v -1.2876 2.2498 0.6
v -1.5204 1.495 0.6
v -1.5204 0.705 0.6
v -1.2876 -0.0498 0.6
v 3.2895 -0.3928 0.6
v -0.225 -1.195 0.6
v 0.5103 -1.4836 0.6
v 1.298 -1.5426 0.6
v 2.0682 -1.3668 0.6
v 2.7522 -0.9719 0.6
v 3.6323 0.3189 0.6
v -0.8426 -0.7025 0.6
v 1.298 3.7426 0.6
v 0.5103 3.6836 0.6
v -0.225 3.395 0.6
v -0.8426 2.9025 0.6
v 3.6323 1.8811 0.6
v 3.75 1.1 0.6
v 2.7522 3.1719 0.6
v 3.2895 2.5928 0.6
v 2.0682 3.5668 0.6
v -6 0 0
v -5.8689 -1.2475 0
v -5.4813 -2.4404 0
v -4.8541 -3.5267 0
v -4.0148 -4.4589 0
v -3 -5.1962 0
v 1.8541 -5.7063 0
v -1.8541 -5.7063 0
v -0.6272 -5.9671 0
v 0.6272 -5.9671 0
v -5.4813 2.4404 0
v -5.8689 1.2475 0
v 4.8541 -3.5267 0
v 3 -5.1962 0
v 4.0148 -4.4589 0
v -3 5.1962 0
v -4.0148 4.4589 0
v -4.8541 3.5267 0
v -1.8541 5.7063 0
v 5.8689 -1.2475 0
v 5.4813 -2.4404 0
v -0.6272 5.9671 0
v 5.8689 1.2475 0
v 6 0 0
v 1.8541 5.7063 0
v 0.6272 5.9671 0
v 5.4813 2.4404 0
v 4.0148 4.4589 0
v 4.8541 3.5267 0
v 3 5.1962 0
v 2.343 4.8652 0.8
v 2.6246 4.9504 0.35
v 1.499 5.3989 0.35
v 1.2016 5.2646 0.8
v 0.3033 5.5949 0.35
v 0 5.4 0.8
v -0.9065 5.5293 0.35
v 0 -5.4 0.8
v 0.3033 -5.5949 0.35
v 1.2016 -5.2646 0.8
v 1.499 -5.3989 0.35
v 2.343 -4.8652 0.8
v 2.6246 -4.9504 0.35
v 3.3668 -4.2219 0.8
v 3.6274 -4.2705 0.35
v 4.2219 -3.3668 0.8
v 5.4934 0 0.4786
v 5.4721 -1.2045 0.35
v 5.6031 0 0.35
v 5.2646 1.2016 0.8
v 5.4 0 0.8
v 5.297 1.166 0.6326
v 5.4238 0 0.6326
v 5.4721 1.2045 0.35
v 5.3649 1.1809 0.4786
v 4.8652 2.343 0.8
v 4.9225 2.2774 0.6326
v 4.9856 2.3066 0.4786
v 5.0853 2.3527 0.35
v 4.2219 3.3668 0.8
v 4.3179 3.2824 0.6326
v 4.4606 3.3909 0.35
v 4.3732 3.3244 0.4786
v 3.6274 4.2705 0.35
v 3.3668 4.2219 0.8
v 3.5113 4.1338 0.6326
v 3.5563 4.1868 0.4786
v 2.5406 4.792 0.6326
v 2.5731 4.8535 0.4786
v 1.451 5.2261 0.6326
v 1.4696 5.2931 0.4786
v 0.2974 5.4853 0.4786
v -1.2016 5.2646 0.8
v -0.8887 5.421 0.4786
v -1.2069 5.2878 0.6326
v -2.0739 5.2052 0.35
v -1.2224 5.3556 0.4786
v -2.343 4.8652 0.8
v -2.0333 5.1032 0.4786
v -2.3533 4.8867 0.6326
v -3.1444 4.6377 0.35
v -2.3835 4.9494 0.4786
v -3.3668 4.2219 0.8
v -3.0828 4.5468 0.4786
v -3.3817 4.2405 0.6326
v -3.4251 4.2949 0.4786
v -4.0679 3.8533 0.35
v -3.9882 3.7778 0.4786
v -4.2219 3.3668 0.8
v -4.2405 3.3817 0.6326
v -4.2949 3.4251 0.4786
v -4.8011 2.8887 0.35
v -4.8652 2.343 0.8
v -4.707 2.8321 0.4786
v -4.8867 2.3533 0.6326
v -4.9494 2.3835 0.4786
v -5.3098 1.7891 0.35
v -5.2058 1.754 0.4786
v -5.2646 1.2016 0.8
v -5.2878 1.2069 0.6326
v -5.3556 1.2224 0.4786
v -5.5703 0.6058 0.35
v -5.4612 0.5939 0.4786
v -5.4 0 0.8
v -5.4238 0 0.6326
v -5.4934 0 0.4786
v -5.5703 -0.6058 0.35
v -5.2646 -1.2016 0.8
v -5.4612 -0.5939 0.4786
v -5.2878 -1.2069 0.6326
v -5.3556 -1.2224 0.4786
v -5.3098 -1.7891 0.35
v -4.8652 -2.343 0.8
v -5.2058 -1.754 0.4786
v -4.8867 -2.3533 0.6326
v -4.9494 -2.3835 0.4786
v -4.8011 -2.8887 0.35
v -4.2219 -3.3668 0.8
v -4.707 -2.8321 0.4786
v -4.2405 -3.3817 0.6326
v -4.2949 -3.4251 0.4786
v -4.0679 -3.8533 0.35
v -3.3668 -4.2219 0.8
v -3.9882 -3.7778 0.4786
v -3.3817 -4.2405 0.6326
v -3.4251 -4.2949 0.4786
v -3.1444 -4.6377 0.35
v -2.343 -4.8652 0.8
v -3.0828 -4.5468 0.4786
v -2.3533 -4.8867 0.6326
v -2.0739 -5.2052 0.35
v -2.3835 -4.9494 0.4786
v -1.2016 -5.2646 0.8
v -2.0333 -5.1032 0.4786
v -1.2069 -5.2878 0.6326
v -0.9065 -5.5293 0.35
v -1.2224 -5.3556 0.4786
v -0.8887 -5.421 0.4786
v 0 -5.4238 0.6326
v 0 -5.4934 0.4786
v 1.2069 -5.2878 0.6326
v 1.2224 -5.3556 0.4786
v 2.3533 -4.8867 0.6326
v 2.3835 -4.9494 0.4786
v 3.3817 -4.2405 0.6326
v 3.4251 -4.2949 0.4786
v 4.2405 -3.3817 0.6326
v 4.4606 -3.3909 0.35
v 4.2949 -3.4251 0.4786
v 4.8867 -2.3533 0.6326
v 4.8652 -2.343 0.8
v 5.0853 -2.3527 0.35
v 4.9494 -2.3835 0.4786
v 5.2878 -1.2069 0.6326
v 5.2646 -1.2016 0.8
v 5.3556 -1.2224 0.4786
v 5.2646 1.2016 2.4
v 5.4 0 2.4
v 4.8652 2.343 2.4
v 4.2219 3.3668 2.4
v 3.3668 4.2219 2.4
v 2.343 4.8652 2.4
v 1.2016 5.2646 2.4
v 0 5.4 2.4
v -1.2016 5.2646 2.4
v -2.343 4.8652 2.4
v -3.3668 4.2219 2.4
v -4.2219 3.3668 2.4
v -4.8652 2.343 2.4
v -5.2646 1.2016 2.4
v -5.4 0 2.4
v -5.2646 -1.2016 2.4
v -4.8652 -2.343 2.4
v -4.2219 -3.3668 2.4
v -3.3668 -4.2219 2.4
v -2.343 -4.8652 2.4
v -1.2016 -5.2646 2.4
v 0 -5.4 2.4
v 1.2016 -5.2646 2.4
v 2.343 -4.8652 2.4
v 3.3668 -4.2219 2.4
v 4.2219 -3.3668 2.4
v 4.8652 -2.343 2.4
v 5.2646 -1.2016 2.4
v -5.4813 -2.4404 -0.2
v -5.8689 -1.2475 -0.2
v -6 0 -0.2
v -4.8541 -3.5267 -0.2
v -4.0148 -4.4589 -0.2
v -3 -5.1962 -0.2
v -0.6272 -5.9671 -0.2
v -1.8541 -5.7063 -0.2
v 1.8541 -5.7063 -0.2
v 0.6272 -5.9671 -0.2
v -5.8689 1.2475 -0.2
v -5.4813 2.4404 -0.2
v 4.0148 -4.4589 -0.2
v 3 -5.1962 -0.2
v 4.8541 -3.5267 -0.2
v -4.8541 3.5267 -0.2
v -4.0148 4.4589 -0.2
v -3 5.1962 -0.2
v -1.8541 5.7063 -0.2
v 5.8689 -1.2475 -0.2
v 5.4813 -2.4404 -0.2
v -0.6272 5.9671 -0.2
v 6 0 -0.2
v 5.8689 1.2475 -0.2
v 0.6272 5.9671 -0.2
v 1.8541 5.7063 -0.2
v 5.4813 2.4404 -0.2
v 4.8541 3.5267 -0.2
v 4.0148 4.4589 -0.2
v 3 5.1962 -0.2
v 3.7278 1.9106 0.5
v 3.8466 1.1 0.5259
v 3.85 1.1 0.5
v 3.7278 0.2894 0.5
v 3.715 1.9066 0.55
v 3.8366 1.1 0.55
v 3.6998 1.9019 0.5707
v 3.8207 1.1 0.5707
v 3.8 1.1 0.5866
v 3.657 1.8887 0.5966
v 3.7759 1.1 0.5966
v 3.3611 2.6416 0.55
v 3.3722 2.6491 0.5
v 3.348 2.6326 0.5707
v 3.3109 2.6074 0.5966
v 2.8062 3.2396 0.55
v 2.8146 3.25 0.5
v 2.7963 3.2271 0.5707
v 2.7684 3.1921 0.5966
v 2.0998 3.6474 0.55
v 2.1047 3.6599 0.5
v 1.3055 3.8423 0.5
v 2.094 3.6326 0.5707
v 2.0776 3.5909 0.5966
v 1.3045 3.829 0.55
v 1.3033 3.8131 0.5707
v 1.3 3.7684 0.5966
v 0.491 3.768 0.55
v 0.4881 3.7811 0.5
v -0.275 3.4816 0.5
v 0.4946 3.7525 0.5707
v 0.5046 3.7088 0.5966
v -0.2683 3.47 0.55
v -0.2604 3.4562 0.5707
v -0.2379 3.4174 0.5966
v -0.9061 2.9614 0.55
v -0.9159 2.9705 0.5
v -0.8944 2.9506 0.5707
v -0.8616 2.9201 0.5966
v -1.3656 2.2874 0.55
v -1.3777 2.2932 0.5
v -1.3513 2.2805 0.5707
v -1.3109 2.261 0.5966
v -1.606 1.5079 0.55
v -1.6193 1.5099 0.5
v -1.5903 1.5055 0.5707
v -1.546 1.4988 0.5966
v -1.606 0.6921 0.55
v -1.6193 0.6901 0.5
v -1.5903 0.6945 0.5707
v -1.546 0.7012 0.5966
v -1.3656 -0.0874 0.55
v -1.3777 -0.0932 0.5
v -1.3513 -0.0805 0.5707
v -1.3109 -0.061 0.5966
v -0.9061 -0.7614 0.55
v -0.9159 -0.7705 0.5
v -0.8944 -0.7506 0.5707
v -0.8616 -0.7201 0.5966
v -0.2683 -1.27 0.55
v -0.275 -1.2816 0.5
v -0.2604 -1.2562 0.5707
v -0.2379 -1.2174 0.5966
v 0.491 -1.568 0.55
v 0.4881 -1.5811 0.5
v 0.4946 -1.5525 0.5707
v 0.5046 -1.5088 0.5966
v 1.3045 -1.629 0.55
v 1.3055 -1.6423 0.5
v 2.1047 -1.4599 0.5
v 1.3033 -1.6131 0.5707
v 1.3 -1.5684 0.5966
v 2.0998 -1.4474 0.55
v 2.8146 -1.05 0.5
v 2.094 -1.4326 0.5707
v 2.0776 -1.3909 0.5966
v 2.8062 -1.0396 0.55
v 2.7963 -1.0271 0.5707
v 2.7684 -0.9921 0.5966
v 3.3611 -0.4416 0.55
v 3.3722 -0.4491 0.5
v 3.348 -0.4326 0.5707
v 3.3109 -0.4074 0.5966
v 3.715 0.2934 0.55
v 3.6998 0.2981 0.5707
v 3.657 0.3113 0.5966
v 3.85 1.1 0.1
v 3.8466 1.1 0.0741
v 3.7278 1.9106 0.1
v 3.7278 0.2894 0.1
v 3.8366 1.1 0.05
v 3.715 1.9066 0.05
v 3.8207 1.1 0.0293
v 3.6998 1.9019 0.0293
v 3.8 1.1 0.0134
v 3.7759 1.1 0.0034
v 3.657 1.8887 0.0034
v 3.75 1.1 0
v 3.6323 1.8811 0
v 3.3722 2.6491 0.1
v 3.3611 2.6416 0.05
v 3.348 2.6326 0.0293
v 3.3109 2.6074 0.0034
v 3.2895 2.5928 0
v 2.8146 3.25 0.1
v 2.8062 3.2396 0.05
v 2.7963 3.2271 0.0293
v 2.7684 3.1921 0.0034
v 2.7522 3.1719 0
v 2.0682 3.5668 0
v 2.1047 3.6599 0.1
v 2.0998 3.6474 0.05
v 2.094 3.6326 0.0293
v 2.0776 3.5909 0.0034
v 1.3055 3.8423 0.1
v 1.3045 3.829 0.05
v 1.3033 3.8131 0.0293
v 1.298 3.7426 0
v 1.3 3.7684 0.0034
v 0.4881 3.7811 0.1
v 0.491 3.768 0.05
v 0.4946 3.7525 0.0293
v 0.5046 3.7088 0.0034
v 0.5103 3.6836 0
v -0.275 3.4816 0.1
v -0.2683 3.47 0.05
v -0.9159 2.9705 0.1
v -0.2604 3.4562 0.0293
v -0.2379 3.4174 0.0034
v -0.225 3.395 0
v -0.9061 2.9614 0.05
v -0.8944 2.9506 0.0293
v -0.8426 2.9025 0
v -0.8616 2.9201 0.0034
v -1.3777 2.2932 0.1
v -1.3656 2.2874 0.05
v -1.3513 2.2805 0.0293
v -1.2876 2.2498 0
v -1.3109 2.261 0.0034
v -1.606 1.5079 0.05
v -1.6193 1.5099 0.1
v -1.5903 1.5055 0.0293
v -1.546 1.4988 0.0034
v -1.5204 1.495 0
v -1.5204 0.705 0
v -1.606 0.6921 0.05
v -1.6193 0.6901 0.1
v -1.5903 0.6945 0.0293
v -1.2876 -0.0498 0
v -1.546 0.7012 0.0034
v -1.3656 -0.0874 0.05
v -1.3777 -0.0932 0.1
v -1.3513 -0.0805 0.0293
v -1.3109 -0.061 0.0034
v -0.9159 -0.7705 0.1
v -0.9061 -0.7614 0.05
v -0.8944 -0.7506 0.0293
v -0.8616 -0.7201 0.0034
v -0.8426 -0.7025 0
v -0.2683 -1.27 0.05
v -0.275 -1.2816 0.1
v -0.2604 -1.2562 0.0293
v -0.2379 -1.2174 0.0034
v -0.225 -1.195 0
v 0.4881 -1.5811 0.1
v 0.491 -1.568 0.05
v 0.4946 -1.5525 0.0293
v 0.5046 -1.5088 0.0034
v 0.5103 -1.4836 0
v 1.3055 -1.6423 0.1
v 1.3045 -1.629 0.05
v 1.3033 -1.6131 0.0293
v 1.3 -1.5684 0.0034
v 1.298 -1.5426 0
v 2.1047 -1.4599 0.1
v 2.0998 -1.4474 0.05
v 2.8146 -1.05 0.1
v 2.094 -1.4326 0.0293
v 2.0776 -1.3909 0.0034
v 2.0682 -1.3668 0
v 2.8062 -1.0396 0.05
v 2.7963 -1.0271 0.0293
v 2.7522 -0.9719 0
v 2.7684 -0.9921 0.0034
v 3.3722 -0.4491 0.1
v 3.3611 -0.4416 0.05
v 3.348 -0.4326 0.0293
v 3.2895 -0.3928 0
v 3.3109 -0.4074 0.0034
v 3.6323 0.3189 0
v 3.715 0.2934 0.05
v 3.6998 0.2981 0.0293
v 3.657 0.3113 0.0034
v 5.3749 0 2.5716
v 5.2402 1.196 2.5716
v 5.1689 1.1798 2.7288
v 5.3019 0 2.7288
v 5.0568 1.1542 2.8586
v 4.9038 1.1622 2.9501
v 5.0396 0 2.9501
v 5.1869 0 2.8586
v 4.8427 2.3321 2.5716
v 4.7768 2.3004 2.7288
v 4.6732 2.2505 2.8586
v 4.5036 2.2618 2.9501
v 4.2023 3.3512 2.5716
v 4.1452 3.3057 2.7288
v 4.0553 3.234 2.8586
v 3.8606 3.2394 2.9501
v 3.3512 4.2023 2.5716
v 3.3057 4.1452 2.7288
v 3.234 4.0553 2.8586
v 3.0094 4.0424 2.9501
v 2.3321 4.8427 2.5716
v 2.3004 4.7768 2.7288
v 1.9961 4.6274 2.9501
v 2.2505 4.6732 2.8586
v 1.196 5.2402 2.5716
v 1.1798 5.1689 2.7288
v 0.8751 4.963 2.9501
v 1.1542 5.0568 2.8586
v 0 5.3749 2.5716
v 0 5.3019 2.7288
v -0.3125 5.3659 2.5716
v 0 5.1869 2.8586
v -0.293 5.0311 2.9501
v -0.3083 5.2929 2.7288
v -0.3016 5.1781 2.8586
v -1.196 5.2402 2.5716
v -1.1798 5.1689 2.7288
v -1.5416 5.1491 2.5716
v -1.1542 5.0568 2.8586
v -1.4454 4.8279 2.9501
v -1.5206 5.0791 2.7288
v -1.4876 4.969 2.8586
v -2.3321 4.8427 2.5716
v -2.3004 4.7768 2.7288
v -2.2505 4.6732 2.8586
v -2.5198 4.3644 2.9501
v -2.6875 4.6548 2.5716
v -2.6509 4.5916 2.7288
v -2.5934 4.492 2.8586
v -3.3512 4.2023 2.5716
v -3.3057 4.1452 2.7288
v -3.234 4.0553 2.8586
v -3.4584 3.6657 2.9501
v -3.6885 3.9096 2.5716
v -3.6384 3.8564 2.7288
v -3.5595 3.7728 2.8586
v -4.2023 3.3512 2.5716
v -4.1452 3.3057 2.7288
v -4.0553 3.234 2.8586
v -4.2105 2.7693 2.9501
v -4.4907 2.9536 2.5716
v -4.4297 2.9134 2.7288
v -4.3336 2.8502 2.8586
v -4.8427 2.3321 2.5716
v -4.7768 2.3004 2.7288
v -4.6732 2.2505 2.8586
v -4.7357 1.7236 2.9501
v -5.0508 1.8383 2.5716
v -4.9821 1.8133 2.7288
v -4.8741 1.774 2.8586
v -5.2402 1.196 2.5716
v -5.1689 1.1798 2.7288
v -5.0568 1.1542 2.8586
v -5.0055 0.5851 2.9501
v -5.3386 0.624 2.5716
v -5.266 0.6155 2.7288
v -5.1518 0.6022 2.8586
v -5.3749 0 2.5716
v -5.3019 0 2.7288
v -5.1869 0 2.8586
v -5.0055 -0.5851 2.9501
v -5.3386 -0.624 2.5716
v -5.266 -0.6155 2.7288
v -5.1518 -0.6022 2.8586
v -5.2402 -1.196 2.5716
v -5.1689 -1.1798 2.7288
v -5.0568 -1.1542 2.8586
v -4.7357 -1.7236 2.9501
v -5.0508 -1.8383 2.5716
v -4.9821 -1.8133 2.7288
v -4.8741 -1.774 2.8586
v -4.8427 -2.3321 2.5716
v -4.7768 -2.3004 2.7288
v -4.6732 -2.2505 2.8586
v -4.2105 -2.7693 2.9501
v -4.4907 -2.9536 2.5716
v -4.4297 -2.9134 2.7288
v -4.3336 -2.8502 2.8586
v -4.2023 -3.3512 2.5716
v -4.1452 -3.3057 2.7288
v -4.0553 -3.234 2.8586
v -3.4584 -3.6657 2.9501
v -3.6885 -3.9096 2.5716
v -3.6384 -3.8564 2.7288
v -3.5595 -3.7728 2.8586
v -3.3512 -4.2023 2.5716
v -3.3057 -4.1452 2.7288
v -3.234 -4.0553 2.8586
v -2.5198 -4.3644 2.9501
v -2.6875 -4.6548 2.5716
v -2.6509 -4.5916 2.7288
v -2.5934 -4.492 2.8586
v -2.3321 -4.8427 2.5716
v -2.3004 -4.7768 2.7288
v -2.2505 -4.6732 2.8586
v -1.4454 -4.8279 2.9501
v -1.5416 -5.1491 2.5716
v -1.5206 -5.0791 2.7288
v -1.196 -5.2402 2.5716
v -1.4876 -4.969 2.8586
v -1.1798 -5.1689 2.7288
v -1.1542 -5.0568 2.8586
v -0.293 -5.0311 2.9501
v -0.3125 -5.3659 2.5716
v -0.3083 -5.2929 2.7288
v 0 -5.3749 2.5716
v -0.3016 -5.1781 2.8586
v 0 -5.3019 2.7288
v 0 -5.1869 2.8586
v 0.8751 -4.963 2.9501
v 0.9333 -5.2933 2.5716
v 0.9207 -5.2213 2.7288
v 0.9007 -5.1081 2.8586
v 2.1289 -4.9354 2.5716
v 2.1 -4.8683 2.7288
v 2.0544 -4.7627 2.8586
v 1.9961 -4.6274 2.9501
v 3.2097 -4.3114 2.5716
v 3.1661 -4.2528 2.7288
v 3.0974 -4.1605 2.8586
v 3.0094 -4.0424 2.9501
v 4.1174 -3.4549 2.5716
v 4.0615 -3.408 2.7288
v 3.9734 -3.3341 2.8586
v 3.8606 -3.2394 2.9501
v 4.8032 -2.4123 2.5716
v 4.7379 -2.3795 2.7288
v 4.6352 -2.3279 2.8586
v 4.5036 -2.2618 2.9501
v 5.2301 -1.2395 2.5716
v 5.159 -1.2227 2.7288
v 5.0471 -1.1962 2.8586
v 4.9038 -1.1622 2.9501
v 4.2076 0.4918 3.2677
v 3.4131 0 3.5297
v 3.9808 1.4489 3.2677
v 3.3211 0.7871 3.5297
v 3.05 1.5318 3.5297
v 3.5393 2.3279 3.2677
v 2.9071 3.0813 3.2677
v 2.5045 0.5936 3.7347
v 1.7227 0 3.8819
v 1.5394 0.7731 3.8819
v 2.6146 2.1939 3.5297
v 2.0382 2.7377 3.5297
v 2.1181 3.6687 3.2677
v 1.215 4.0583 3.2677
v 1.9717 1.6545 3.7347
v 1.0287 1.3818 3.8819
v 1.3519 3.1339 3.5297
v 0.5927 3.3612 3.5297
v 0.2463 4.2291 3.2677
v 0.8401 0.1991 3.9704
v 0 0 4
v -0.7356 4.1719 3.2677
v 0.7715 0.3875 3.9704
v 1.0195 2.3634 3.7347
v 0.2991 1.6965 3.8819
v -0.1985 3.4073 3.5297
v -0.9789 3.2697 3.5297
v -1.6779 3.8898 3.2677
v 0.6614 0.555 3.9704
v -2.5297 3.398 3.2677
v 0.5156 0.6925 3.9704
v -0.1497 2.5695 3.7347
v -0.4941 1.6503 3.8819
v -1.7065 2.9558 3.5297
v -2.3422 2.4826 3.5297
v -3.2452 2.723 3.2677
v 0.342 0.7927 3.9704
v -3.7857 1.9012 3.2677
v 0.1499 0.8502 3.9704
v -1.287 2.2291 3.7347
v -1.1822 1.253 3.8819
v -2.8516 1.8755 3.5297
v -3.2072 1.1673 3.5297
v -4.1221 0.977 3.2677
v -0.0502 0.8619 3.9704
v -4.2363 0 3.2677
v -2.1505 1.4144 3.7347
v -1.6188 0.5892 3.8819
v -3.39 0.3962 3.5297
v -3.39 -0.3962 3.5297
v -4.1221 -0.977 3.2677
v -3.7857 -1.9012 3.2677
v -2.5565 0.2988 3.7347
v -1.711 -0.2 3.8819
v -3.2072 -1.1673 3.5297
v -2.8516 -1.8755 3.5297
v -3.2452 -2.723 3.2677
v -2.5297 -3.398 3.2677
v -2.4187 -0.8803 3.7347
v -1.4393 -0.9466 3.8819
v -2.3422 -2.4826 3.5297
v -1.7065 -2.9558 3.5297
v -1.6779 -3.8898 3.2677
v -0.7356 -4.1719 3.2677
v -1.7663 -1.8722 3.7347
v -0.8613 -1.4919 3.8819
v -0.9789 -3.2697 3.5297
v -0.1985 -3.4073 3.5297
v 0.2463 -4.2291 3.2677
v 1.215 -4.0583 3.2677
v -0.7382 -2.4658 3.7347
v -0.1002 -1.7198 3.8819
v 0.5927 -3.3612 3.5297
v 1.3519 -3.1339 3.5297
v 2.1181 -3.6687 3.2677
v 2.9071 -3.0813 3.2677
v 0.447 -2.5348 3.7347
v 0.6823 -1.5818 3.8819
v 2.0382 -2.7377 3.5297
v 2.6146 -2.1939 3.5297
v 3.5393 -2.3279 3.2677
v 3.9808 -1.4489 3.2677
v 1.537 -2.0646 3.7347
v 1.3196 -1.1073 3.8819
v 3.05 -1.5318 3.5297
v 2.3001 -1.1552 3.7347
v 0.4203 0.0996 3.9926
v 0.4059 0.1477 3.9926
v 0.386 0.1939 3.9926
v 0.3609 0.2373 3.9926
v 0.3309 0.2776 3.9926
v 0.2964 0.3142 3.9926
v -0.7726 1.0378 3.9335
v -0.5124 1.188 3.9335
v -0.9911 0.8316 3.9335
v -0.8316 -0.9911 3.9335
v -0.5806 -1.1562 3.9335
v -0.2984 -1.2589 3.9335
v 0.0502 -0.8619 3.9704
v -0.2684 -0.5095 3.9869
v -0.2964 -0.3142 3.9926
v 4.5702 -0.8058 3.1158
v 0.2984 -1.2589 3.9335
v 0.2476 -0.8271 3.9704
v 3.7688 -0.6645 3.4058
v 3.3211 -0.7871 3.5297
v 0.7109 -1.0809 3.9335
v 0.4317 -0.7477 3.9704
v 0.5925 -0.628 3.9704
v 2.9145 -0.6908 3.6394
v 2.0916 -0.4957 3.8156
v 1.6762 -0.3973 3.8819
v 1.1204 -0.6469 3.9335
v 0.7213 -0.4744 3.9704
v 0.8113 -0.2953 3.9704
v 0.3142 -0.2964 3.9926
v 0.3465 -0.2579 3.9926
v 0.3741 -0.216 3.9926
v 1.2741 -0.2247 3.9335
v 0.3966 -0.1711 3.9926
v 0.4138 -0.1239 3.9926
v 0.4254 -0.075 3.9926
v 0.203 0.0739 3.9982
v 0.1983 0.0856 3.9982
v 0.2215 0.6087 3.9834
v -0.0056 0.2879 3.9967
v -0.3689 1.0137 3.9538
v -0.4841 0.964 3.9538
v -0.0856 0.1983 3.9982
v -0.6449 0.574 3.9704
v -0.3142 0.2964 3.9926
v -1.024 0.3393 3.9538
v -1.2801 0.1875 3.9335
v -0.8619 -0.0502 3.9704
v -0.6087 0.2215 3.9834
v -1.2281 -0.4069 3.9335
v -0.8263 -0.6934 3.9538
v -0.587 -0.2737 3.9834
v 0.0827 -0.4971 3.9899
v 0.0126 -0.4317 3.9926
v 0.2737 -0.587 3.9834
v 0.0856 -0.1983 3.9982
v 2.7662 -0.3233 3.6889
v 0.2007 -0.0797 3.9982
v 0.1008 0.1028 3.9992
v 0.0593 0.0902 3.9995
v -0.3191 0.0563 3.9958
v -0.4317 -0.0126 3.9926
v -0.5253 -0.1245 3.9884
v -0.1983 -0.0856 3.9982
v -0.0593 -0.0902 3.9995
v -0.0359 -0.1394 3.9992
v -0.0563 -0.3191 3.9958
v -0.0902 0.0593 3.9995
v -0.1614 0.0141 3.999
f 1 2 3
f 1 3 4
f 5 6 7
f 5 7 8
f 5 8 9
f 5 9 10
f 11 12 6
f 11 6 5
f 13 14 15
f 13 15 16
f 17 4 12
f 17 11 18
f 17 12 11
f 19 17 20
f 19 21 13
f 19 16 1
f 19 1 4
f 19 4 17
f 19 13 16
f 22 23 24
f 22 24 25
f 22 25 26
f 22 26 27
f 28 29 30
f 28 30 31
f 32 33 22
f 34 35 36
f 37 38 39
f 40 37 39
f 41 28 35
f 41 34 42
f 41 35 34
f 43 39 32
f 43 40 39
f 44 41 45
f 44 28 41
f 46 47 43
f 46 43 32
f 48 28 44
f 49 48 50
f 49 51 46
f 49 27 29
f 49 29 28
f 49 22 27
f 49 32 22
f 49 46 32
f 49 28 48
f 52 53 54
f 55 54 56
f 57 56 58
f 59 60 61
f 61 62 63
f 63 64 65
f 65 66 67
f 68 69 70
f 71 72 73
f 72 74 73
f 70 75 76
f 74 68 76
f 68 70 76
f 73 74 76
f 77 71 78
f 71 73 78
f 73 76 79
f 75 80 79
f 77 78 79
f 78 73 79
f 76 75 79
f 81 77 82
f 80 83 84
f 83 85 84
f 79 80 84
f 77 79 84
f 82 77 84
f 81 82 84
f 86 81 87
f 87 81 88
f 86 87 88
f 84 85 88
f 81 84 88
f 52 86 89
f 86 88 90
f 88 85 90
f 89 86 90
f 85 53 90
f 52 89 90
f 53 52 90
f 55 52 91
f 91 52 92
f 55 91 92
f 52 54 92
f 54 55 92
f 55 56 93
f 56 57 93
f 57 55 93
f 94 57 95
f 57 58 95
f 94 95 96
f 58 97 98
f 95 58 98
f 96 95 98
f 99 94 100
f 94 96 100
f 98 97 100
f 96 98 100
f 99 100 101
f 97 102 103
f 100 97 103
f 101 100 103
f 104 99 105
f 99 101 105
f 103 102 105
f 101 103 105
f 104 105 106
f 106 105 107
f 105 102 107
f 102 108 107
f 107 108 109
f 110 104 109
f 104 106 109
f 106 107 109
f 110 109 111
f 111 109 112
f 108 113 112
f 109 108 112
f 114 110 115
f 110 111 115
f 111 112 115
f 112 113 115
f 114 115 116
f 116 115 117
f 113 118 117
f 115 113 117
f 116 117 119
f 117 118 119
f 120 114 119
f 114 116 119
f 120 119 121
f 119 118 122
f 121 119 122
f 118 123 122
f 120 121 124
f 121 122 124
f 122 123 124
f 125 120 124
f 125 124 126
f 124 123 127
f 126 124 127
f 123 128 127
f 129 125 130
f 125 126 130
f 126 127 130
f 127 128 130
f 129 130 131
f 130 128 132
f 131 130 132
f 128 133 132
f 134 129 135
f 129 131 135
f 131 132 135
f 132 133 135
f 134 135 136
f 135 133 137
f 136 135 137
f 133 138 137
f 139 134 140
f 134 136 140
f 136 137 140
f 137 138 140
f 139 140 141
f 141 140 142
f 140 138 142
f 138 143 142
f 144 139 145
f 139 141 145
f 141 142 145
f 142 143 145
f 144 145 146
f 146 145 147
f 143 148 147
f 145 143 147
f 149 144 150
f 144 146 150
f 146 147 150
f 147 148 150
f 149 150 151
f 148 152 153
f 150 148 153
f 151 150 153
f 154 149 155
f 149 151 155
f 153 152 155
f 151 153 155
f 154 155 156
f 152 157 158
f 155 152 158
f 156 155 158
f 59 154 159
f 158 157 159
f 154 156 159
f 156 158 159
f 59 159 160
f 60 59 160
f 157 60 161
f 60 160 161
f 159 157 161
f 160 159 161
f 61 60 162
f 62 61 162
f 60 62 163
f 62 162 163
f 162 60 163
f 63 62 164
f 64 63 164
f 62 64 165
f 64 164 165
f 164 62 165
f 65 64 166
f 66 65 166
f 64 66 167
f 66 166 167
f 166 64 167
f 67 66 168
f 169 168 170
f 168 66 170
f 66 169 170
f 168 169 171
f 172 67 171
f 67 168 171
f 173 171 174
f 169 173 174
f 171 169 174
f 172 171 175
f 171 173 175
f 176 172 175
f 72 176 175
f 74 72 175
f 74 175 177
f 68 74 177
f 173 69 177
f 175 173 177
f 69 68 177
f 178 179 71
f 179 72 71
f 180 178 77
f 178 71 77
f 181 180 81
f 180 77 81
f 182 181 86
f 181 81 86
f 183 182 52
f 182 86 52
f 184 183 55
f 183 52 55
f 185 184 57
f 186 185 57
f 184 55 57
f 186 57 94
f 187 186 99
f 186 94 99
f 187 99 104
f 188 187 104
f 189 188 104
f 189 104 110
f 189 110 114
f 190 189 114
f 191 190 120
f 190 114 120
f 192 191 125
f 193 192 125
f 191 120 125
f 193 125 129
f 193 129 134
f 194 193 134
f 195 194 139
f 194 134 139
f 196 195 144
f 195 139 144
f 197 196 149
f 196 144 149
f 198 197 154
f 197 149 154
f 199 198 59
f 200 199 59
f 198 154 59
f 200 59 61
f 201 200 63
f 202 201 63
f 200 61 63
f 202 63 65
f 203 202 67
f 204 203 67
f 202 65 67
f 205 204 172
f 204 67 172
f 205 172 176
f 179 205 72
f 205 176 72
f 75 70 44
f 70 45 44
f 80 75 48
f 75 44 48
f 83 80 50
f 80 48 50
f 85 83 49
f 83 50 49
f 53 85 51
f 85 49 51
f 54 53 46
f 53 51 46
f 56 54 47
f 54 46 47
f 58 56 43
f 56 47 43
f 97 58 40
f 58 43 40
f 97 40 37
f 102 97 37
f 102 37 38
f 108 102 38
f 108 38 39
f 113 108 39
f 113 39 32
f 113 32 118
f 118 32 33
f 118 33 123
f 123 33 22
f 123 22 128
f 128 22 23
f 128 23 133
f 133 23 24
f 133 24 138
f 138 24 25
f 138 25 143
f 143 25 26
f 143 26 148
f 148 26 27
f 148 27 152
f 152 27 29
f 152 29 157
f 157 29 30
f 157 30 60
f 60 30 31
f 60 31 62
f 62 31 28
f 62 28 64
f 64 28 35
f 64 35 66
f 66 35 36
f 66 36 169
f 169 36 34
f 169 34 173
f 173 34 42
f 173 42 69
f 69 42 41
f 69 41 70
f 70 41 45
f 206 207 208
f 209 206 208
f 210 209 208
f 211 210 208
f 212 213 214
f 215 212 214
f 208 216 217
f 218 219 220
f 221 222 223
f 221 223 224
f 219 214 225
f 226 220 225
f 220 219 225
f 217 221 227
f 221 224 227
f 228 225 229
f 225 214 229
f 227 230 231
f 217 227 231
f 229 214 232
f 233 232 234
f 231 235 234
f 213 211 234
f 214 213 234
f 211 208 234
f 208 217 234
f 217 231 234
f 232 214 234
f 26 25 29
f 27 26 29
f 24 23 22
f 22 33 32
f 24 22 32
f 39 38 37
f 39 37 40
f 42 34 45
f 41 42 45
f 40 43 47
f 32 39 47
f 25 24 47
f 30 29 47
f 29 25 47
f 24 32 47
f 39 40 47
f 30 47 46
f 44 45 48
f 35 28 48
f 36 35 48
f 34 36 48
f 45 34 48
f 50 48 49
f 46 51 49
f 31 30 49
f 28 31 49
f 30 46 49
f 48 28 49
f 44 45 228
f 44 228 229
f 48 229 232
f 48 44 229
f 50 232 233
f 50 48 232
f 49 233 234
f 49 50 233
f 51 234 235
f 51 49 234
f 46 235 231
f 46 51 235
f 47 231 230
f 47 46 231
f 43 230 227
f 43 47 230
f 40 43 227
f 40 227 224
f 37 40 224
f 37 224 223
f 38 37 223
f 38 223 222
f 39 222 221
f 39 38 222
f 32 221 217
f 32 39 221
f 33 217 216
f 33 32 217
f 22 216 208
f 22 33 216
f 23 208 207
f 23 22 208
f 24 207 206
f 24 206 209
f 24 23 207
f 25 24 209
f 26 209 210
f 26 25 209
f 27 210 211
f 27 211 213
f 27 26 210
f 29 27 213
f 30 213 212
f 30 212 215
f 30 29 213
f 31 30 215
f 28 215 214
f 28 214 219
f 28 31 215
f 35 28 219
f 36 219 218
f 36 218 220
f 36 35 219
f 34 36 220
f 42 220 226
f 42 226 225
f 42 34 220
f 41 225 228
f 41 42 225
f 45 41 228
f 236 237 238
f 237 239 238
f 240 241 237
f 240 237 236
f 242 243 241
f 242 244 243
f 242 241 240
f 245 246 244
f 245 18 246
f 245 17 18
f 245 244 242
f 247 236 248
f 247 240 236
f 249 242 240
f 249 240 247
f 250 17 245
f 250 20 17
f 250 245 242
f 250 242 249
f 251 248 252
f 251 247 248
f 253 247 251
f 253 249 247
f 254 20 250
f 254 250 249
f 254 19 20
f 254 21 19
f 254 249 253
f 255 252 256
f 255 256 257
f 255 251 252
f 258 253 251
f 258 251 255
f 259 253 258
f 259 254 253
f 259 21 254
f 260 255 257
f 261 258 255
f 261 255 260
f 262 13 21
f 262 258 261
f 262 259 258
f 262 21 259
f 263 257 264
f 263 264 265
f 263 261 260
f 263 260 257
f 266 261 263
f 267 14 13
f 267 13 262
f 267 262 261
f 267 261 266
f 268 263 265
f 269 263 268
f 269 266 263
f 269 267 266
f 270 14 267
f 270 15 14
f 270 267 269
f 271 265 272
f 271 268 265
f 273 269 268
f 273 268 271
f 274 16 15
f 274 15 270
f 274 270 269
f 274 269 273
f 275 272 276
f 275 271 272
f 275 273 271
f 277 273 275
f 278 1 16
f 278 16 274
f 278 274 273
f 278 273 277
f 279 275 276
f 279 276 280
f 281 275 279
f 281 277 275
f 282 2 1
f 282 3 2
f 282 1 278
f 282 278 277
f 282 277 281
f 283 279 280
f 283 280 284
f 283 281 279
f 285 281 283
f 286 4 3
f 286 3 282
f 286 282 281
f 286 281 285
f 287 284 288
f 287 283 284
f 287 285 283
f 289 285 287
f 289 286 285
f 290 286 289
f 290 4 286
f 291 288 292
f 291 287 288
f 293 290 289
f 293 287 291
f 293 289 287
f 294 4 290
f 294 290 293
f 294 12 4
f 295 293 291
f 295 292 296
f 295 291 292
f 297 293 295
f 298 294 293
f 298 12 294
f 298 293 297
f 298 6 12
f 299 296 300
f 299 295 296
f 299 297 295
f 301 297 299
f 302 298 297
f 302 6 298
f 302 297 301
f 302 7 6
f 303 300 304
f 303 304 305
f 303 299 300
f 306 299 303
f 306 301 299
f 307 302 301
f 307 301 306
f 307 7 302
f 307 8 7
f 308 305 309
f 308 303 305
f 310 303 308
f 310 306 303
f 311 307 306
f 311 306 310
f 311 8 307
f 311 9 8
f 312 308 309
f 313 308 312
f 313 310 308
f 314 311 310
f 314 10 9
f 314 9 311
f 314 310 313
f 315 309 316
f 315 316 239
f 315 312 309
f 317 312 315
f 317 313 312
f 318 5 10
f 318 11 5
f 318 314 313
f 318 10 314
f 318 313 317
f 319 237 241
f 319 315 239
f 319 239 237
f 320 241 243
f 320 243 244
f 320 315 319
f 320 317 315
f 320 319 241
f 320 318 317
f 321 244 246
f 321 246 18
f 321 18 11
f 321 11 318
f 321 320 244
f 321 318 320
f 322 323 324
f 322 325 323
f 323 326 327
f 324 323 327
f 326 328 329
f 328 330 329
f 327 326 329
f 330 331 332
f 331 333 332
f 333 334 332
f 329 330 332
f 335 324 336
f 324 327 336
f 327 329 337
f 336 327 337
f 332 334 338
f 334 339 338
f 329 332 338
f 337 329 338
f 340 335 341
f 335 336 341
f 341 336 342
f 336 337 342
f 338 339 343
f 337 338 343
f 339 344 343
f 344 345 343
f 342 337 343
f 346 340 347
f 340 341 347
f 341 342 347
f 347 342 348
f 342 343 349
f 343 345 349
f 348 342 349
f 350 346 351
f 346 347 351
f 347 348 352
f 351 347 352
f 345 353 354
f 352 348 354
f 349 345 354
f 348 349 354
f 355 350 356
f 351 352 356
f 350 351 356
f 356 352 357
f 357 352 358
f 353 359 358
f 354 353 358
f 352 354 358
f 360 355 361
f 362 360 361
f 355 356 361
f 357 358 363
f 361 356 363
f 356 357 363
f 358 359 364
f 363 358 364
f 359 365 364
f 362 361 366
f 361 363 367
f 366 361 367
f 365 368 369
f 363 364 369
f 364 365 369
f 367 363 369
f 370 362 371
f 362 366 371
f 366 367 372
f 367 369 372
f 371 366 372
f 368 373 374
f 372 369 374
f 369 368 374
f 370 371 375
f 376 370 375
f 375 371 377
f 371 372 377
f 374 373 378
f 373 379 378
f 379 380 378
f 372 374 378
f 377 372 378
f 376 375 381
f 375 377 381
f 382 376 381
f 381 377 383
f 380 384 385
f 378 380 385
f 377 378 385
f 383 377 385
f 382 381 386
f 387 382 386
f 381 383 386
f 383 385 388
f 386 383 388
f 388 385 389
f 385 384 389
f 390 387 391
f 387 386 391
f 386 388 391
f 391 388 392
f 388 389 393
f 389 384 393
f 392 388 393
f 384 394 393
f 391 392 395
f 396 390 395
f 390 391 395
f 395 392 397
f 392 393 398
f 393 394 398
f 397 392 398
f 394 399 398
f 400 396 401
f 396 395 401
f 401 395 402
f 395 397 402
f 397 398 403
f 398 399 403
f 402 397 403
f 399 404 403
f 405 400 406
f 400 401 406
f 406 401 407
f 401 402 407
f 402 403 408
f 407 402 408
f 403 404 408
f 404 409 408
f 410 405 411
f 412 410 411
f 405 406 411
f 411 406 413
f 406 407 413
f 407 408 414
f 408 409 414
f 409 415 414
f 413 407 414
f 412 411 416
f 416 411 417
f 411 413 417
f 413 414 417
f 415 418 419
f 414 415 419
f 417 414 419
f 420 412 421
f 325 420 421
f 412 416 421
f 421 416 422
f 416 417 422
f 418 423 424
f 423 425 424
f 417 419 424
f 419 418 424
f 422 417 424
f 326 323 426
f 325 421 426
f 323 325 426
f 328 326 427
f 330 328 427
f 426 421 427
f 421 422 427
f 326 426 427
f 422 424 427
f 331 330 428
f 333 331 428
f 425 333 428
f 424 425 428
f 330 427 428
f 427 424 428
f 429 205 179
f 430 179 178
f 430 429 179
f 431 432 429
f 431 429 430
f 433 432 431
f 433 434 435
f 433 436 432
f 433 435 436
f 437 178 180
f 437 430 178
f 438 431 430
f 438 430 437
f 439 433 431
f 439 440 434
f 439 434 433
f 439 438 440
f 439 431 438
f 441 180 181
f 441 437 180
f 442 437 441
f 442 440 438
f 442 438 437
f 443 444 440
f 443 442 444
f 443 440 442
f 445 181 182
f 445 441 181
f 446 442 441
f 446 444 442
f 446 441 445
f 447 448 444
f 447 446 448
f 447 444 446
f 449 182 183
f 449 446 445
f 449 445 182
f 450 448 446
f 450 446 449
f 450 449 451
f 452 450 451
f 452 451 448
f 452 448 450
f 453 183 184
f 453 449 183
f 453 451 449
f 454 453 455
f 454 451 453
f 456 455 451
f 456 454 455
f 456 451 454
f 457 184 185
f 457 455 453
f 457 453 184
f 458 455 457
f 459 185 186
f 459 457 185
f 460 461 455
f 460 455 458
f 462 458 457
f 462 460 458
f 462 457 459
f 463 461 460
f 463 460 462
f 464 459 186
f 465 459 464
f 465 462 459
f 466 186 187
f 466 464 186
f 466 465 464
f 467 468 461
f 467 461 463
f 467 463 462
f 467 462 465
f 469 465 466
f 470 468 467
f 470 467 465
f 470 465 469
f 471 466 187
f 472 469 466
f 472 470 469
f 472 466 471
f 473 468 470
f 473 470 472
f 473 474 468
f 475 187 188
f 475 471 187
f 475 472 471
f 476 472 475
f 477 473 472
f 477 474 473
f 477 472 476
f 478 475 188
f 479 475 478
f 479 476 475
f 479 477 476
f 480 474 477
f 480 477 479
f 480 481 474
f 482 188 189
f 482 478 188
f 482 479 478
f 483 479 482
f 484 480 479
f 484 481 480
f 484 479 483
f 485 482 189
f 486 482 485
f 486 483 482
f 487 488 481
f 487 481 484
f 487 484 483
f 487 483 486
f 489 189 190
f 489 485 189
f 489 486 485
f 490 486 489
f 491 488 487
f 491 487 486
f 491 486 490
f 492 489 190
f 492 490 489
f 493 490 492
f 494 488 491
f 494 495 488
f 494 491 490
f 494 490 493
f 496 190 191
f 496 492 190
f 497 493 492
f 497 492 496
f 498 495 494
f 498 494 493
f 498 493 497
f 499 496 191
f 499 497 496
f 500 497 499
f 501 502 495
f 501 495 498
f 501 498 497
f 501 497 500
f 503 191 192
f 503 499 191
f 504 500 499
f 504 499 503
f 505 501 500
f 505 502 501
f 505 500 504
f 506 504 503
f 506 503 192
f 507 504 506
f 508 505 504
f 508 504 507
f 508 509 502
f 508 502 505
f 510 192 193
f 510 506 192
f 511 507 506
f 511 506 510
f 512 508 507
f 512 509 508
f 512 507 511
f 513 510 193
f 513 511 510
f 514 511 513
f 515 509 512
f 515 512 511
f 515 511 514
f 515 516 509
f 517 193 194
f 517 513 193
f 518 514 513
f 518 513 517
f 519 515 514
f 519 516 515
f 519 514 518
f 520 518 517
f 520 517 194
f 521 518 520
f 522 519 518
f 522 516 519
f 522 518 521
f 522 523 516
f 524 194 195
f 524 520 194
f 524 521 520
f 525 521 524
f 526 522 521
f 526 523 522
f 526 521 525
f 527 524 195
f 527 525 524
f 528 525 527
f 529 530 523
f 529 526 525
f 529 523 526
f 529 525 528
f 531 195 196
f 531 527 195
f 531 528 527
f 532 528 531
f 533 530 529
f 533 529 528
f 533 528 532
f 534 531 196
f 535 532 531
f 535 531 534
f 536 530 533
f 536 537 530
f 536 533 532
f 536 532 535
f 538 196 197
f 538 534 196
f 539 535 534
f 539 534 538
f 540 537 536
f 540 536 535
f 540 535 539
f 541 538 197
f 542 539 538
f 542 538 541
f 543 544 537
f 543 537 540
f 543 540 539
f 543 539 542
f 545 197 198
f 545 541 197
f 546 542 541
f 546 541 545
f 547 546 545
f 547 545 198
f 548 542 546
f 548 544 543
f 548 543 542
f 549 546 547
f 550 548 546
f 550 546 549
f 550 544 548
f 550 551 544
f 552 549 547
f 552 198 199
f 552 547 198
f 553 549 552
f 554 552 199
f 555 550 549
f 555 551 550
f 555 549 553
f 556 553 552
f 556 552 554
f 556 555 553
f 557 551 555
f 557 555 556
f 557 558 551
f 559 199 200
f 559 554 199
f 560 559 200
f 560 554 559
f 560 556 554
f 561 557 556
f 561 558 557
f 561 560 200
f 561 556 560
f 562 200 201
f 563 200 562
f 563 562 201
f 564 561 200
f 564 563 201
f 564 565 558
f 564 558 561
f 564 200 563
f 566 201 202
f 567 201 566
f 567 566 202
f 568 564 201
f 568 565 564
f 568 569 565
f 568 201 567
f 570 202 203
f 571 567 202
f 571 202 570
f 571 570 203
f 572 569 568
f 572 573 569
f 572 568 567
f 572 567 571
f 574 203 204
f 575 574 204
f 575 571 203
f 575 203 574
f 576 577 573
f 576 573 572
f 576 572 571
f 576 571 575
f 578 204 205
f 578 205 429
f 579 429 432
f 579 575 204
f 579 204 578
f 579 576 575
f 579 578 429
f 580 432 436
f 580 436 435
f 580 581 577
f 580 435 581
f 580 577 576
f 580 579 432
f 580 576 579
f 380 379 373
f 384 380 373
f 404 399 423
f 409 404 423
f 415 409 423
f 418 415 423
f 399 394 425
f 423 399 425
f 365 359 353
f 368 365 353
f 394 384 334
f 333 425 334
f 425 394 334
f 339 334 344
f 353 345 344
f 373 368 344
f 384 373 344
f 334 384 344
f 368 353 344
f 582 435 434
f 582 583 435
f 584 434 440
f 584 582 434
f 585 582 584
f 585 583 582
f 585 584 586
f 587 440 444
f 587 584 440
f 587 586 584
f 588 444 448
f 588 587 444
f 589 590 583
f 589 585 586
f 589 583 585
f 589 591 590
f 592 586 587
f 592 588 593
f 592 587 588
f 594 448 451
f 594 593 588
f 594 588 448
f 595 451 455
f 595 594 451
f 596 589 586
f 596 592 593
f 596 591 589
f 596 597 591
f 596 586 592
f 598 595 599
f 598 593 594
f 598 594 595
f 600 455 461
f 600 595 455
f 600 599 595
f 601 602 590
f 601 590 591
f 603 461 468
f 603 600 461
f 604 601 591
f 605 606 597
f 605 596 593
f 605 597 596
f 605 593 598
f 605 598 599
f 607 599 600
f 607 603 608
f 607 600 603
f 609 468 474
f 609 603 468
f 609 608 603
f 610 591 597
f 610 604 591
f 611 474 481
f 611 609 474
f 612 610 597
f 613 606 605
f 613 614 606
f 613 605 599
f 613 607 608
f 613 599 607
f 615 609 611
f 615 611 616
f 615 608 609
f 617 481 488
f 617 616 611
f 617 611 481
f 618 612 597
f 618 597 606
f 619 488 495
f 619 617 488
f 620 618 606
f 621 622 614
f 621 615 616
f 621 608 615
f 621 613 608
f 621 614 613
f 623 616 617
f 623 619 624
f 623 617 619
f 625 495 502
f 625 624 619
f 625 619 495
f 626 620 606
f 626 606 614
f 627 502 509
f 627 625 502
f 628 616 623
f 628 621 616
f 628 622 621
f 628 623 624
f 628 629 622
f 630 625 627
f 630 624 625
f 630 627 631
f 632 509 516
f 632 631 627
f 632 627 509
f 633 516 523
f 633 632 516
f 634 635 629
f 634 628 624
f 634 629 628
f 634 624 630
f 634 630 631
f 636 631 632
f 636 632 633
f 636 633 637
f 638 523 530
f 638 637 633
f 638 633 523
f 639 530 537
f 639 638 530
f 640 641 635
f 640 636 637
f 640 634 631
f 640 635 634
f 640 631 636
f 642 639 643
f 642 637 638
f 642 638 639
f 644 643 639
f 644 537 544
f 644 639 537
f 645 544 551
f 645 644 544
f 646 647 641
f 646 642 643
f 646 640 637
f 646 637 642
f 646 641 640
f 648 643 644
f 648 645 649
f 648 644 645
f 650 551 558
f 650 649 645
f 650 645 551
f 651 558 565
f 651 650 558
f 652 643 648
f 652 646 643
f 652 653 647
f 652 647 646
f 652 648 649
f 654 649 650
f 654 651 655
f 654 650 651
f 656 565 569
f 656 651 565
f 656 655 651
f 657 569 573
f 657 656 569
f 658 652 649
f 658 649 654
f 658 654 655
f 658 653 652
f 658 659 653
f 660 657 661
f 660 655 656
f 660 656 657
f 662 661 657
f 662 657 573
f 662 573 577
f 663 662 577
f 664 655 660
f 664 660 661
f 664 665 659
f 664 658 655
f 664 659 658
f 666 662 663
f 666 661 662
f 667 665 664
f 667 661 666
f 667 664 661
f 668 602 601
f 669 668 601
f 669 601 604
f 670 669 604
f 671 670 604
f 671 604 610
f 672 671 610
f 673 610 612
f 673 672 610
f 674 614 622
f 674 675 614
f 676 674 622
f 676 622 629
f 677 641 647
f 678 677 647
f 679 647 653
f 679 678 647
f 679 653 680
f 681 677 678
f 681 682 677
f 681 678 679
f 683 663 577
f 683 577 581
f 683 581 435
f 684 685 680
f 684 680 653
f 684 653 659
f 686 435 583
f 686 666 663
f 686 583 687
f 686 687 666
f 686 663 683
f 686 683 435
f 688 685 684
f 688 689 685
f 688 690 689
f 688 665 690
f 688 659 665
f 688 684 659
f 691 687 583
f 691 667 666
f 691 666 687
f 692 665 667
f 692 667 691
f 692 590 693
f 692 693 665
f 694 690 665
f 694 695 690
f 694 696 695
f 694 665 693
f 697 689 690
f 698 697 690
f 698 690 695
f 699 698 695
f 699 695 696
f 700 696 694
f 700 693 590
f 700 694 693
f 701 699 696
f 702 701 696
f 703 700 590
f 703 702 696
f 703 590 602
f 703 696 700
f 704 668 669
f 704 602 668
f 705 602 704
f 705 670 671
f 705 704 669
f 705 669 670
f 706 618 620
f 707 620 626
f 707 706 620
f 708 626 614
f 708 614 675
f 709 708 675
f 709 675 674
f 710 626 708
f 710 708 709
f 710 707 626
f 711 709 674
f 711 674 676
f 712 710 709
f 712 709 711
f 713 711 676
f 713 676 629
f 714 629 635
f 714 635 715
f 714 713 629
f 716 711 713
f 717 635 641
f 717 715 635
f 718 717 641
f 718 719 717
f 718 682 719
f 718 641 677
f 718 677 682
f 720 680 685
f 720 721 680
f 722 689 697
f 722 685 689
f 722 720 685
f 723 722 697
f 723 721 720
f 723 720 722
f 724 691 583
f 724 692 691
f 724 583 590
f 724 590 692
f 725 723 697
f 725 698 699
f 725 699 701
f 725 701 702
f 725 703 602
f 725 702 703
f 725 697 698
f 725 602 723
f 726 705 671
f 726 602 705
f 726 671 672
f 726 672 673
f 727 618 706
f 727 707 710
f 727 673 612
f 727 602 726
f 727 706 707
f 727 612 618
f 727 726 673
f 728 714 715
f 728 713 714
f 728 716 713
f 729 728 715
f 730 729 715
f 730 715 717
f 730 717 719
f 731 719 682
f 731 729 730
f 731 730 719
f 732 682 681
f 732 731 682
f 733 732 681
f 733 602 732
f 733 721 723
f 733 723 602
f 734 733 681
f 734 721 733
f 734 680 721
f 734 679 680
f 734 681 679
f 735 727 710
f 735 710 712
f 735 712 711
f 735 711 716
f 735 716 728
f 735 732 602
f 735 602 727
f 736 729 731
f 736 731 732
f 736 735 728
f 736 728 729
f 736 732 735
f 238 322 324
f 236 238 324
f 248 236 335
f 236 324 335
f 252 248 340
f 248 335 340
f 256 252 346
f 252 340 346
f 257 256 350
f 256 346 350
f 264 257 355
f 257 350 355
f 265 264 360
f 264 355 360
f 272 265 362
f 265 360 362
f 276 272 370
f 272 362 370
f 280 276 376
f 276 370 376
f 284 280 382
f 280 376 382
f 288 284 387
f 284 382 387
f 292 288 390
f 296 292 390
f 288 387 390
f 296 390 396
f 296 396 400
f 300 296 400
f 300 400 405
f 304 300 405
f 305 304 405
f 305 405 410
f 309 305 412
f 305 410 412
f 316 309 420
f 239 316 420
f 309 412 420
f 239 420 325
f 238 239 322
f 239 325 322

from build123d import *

# Parameters (mm, degrees)
SKETCH009_R  = 6
PAD005_DEPTH = 0.2
SKETCH010_R  = 2.75
PAD006_DEPTH = 0.6
FILLET_R     = 0.1


with BuildPart() as body_clear_cover:
    # Sketch008 → Revolution (revolve)
    with BuildSketch(Plane.XZ):
        with BuildLine():
            Line((6, 0), (0, 0))
            Line((0, 0), (0, 4))
            ThreePointArc((5.039601, 2.950083), (2.573903, 3.734733), (0, 4))
            ThreePointArc((5.4, 2.4), (5.301877, 2.728816), (5.039601, 2.950083))
            Line((5.4, 2.4), (5.4, 0.8))
            ThreePointArc((5.4, 0.8), (5.453137, 0.553137), (5.603137, 0.35))
            Line((5.603137, 0.35), (6, 0))
        make_face()
    revolve(axis=Axis((0, 0, 0), (0, 0, 1)))


with BuildPart() as body_base:
    # Sketch009 → Pad005 (new body)
    with BuildSketch(Plane.XY):
        Circle(SKETCH009_R)
    extrude(amount=-PAD005_DEPTH)


with BuildPart() as body_pupil:
    # Sketch010 → Pad006 (new body)
    with BuildSketch(Plane.XY):
        with Locations((1.1, 1.1)):
            Circle(SKETCH010_R)
    extrude(amount=PAD006_DEPTH)

    # Fillet
    fillet_edges = [body_pupil.edges().sort_by_distance(p)[0] for p in [
        (-1.65, 1.1, 0),
        (-1.65, 1.1, 0.6),
    ]]
    fillet(fillet_edges, radius=FILLET_R)


solid = Compound([body_clear_cover.part, body_base.part, body_pupil.part])
